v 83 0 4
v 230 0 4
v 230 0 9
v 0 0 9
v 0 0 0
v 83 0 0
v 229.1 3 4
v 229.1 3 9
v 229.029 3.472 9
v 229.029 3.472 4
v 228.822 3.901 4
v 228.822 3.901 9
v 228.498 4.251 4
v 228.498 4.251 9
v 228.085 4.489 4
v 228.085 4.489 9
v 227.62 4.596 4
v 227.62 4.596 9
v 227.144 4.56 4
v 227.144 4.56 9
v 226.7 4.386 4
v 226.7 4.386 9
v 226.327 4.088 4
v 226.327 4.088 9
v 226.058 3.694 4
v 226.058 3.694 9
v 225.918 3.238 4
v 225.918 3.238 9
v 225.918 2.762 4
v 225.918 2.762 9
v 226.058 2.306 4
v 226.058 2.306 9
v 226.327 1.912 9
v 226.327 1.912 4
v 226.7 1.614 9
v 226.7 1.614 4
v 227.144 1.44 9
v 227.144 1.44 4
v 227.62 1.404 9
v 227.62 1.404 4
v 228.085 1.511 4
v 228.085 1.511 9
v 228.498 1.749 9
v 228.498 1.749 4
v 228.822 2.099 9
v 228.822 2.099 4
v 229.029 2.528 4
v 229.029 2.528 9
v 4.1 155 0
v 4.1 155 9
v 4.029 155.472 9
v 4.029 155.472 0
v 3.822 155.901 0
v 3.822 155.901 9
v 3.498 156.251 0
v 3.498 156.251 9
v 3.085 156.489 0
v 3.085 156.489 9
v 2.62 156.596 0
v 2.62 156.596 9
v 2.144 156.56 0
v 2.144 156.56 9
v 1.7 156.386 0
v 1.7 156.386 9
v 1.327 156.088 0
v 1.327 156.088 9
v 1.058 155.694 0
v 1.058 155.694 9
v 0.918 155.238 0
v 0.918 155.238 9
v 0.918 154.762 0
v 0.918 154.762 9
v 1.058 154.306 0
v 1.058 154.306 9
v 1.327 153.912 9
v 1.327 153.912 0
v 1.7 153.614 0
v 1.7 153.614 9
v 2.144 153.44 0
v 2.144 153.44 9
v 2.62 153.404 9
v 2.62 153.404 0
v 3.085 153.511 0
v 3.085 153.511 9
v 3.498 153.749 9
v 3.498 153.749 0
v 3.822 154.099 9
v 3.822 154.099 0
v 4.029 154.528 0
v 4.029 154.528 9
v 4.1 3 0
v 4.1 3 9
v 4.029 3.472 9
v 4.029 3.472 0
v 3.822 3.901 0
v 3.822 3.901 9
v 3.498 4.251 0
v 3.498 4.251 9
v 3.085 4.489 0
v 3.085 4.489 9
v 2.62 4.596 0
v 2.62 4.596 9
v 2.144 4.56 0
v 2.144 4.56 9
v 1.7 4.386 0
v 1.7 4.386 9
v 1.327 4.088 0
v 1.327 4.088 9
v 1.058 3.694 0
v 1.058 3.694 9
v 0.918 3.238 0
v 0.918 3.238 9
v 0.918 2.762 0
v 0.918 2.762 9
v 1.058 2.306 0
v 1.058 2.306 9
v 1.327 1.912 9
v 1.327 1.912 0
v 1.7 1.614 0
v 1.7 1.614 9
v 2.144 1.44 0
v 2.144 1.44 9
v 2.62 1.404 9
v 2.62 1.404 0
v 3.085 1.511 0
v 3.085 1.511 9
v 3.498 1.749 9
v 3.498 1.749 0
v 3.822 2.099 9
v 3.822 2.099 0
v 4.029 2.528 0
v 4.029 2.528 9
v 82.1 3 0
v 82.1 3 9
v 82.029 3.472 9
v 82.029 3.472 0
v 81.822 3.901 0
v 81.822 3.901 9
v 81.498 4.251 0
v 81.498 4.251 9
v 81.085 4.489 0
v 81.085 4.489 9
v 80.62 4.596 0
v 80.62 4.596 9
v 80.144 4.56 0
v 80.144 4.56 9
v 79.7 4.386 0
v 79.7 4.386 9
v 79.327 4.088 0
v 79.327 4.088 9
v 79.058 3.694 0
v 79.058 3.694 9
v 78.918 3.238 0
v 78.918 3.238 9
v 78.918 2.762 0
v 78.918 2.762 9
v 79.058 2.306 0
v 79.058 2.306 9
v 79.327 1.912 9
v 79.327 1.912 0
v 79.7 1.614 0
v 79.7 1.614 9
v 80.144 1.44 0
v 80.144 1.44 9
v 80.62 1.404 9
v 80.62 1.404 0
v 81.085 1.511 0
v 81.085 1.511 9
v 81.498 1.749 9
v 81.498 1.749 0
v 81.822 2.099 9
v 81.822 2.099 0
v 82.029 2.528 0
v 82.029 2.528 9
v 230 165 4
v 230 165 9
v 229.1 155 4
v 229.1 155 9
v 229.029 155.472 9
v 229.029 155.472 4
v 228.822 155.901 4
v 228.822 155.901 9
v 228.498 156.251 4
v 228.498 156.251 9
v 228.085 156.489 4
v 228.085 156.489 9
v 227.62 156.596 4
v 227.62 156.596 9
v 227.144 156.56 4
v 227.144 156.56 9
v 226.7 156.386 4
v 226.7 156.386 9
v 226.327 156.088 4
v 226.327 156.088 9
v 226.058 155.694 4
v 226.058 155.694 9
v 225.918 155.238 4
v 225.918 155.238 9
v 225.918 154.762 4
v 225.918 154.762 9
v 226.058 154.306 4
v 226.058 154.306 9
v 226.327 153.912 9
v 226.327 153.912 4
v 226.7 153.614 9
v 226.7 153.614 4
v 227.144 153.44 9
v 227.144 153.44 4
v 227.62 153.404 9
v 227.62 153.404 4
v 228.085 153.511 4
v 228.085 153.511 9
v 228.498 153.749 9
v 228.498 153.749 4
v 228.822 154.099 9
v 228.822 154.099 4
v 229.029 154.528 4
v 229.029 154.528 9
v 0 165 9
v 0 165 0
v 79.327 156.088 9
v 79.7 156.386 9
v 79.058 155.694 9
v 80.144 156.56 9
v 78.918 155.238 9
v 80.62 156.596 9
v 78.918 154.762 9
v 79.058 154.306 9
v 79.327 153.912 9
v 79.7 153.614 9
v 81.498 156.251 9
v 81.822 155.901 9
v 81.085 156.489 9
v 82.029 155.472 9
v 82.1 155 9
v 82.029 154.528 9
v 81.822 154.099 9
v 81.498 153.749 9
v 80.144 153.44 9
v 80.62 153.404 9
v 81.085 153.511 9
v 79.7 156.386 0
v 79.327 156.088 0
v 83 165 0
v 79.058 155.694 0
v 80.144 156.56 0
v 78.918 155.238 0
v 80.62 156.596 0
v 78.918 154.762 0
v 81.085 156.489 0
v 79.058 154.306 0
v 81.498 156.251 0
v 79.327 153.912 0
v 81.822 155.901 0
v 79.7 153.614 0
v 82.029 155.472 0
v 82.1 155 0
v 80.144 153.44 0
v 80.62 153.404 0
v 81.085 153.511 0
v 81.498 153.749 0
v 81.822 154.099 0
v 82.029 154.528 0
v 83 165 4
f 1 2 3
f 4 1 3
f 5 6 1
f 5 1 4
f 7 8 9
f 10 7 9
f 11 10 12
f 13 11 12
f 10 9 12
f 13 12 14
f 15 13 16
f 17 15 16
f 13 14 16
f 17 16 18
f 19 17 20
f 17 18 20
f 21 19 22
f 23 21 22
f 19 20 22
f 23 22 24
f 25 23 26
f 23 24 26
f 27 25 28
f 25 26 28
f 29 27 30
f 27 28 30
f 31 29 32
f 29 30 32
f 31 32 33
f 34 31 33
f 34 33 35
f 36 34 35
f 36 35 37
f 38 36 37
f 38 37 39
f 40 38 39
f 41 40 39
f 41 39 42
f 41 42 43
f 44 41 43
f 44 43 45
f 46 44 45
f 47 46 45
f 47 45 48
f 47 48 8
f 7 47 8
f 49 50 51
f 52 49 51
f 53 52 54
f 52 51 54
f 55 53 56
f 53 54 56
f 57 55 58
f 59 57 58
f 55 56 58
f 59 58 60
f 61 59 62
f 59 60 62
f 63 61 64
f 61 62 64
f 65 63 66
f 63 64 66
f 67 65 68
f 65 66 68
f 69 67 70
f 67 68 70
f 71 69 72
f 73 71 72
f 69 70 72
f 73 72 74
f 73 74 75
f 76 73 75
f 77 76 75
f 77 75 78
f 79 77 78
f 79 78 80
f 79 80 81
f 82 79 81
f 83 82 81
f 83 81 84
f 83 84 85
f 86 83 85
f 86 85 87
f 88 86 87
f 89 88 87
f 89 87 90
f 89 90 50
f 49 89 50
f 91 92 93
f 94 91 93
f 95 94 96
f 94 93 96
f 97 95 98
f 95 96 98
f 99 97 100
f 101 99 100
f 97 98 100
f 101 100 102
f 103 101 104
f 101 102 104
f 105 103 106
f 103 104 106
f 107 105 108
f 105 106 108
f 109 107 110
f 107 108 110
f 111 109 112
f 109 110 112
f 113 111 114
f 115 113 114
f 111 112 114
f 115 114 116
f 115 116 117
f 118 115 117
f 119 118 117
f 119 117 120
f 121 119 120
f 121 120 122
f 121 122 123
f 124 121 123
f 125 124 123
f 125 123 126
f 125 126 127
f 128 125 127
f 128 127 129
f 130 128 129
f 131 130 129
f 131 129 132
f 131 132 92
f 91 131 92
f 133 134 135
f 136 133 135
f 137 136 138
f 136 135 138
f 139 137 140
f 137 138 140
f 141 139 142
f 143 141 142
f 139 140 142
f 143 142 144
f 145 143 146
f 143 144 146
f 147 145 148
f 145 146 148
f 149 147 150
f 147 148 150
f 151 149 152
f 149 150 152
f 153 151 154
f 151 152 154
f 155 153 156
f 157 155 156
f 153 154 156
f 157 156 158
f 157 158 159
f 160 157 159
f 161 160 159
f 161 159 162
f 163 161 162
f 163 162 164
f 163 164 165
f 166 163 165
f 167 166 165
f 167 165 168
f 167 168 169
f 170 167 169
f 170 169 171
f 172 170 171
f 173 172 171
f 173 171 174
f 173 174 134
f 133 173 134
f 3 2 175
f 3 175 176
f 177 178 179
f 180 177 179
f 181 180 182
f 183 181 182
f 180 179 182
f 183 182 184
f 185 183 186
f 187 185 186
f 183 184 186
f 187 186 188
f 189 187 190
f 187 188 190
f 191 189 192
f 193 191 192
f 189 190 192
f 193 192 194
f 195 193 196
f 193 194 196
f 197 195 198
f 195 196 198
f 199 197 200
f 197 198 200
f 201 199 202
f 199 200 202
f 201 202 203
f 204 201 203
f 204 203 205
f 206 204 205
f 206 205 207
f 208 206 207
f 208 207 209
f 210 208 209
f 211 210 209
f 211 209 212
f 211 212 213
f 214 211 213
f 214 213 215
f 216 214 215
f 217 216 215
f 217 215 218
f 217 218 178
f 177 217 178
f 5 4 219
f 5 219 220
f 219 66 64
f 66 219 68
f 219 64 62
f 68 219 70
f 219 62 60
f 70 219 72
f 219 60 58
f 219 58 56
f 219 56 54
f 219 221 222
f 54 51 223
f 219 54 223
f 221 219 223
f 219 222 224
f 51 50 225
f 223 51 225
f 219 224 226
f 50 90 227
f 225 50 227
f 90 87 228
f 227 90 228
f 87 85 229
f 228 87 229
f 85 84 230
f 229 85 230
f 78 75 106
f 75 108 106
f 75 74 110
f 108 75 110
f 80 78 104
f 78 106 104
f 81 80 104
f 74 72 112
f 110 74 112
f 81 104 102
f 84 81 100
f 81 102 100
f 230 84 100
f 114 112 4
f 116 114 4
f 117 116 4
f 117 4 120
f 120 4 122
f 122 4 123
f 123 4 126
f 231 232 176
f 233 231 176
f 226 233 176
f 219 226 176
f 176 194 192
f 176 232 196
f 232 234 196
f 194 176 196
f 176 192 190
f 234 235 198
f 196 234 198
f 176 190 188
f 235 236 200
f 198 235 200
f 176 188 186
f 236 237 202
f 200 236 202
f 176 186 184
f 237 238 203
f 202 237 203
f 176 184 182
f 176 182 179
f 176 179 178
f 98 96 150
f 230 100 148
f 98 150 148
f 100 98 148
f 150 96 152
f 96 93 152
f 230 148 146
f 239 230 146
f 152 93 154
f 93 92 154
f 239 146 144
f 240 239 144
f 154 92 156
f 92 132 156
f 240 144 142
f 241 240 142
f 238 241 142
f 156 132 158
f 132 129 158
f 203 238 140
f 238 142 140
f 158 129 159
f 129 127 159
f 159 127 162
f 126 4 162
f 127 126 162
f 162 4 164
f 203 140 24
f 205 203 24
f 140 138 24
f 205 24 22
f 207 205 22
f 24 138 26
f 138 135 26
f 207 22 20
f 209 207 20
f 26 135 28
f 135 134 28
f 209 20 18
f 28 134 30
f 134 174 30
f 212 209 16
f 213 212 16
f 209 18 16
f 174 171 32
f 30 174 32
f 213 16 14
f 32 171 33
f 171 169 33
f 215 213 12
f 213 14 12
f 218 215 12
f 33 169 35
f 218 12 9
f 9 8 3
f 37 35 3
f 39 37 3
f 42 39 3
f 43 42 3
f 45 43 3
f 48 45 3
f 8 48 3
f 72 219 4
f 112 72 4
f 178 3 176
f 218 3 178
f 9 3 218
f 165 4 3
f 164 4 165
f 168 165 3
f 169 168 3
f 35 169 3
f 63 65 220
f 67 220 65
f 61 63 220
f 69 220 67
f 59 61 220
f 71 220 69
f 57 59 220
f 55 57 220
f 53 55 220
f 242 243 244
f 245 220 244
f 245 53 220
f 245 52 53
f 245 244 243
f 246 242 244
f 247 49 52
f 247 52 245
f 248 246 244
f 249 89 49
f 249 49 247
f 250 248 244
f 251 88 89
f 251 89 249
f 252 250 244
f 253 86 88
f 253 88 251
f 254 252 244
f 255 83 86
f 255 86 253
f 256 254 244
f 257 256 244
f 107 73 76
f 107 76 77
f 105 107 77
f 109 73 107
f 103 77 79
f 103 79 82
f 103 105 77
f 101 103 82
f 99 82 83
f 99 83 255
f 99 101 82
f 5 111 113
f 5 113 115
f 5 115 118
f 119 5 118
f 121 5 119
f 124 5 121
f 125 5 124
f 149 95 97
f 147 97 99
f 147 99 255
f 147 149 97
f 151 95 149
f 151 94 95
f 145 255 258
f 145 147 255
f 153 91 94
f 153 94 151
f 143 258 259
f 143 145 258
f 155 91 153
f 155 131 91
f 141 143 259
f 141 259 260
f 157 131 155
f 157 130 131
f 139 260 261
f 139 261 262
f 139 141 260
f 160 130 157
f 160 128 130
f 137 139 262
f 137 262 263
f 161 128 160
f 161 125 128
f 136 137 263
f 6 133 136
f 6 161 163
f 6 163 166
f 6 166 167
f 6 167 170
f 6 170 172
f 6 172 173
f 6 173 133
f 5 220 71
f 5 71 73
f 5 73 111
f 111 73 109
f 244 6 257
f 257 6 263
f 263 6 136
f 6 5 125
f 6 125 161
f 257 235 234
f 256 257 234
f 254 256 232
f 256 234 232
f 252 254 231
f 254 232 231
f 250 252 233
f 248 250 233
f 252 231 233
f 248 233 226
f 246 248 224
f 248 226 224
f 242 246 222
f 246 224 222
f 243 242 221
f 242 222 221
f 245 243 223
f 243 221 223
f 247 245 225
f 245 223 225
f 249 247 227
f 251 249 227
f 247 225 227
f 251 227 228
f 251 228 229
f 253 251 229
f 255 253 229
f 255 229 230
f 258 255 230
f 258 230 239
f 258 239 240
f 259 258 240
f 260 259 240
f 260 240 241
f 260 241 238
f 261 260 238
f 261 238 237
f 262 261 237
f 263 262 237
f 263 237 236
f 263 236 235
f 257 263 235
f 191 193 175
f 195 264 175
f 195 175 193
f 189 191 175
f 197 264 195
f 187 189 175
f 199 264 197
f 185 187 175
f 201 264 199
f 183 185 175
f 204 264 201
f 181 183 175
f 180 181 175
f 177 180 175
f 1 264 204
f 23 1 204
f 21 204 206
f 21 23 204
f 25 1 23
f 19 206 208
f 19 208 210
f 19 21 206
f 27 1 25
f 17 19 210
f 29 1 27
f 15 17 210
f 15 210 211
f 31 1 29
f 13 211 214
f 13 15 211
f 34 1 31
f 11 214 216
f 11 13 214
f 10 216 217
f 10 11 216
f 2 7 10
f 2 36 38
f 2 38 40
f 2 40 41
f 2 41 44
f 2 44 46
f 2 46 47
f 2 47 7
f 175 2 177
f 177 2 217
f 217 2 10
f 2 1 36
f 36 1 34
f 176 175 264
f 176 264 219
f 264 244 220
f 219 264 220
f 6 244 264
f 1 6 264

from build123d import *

# Parameters (mm, degrees)
EXTRUDE_1_DEPTH     = 165
SKETCH_2_R          = 1.6
CUT_EXTRUDE_1_DEPTH = 284.20663834


with BuildPart() as part:
    # 草图1 → 凸台-拉伸1 (new body)
    with BuildSketch(Plane(origin=(0, 0, 0), x_dir=(1, 0, 0), z_dir=(0, 1, 0))):
        Polygon((0, 0), (83, 0), (83, -4), (230, -4), (230, -9), (83, -9), (0, -9), align=None)
    extrude(amount=EXTRUDE_1_DEPTH)

    # 草图2 → 切除-拉伸1 (cut, through all)
    with BuildSketch(Plane.XY.offset(9)):
        with Locations((227.5, 3)):
            Circle(SKETCH_2_R)
        with Locations((227.5, 155)):
            Circle(SKETCH_2_R)
        with Locations((80.5, 155)):
            Circle(SKETCH_2_R)
        with Locations((80.5, 3)):
            Circle(SKETCH_2_R)
        with Locations((2.5, 155)):
            Circle(SKETCH_2_R)
        with Locations((2.5, 3)):
            Circle(SKETCH_2_R)
    extrude(amount=-CUT_EXTRUDE_1_DEPTH, mode=Mode.SUBTRACT)


solid = part.part
